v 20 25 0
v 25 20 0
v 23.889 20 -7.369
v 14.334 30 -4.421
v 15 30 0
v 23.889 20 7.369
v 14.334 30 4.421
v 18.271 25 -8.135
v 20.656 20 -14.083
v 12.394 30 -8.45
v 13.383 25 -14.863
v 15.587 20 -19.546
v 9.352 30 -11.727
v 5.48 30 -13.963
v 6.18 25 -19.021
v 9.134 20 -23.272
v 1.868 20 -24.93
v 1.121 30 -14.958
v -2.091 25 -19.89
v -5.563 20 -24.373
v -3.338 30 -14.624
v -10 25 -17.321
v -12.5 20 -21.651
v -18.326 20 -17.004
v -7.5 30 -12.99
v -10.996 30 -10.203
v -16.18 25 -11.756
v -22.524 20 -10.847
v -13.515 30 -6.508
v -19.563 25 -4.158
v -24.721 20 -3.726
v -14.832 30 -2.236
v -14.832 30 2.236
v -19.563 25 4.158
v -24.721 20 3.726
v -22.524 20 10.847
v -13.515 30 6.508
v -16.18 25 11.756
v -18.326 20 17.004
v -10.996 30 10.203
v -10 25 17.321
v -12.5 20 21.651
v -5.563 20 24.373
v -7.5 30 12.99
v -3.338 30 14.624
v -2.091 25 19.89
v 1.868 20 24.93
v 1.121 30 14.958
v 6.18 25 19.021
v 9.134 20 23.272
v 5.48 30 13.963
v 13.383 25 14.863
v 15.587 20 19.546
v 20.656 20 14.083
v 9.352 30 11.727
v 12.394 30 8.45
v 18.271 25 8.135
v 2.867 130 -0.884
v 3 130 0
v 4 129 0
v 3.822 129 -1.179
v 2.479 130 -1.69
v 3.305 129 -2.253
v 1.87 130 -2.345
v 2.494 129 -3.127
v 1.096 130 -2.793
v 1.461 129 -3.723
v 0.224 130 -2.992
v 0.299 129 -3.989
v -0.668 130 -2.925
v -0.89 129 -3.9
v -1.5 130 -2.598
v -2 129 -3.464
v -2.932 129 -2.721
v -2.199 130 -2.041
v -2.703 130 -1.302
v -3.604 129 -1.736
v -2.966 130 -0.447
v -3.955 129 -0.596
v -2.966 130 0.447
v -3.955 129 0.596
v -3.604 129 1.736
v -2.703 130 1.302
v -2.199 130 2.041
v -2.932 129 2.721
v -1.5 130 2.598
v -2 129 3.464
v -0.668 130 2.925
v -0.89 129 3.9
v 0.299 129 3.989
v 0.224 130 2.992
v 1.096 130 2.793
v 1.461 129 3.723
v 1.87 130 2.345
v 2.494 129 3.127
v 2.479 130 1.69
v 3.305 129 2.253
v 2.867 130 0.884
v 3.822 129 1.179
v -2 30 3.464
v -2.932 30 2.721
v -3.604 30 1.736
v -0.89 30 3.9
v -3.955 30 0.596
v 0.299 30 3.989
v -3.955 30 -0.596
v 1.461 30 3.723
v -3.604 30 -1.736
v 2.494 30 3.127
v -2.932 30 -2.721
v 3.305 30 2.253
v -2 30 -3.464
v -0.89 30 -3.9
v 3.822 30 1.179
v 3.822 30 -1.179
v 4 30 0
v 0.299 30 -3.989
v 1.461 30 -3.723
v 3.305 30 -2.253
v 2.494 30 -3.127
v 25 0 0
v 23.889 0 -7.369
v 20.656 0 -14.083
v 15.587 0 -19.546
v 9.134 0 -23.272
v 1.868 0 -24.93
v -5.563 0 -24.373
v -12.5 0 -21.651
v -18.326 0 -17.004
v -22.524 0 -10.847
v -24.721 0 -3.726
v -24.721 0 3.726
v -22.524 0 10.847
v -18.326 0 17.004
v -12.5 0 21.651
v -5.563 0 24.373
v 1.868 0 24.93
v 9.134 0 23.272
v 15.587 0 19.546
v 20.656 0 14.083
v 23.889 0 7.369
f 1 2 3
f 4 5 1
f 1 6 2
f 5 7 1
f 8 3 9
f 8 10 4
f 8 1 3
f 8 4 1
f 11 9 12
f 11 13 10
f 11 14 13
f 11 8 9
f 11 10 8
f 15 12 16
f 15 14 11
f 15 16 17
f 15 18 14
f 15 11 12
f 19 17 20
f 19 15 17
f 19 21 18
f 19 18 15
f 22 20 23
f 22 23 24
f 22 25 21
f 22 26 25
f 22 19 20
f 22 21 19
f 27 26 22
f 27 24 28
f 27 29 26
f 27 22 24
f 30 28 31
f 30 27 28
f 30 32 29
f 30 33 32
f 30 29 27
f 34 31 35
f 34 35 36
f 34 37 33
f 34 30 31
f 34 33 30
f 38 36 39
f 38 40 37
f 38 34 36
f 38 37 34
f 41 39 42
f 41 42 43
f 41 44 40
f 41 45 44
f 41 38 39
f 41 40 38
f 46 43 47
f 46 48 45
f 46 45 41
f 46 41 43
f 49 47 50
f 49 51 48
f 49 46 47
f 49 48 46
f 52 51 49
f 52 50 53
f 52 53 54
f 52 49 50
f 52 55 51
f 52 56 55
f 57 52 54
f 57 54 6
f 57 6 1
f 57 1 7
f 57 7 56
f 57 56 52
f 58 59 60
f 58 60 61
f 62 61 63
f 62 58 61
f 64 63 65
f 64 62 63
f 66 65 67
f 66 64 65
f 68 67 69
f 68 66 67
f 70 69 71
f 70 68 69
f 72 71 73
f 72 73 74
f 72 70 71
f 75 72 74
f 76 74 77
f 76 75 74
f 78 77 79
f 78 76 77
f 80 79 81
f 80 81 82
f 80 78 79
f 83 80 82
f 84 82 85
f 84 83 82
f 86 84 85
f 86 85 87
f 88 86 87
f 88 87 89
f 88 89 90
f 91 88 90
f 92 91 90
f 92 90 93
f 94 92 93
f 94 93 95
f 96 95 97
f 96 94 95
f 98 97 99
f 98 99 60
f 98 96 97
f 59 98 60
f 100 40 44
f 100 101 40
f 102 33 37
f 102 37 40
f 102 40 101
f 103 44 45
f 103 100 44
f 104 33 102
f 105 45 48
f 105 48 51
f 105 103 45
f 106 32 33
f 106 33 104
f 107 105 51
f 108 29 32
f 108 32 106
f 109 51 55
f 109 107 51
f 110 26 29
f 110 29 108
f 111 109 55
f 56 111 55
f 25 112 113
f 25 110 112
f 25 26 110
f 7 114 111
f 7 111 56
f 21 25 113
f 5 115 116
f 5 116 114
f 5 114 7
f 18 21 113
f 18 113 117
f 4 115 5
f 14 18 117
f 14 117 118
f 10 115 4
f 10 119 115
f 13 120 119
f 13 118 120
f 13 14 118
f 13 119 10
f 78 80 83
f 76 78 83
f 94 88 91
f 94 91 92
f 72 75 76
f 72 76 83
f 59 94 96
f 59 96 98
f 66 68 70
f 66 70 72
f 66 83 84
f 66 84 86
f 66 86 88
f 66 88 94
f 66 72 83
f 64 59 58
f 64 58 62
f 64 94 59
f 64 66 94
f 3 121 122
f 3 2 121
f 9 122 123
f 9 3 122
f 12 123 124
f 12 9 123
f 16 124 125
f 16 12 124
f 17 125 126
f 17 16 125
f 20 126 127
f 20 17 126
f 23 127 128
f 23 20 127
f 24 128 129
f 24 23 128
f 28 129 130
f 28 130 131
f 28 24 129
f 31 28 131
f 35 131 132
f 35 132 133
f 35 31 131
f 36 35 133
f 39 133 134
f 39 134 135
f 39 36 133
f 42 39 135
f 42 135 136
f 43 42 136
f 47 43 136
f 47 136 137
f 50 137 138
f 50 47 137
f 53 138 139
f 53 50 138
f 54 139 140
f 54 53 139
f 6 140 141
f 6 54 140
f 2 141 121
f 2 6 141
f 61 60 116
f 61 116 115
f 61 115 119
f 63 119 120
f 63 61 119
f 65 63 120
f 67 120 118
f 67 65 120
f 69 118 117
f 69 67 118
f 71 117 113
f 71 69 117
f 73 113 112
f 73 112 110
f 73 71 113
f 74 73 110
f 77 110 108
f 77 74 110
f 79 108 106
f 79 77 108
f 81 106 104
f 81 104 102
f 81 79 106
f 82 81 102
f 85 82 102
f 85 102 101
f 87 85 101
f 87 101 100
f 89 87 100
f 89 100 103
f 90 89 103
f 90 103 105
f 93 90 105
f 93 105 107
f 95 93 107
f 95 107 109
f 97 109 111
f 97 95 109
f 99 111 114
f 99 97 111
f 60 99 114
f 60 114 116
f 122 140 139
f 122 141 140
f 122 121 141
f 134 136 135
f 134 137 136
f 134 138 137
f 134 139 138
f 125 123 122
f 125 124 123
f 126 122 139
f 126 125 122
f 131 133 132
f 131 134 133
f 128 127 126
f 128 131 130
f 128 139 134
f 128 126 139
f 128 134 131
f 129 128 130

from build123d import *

# Parameters (mm, degrees)
CHAMFER_1_SIZE = 1


with BuildPart() as part:
    # Эскиз1 → Повернуть1 (revolve)
    with BuildSketch(Plane.XY):
        Polygon((0, 0), (25, 0), (25, 20), (15, 30), (4, 30), (4, 130), (0, 130), align=None)
    revolve(axis=Axis((0, 0, 0), (0, 1, 0)))

    # Фаска1
    chamfer_1_edges = [part.edges().sort_by_distance(p)[0] for p in [
        (-4, 130, 0),
    ]]
    chamfer(chamfer_1_edges, length=CHAMFER_1_SIZE)


solid = part.part
